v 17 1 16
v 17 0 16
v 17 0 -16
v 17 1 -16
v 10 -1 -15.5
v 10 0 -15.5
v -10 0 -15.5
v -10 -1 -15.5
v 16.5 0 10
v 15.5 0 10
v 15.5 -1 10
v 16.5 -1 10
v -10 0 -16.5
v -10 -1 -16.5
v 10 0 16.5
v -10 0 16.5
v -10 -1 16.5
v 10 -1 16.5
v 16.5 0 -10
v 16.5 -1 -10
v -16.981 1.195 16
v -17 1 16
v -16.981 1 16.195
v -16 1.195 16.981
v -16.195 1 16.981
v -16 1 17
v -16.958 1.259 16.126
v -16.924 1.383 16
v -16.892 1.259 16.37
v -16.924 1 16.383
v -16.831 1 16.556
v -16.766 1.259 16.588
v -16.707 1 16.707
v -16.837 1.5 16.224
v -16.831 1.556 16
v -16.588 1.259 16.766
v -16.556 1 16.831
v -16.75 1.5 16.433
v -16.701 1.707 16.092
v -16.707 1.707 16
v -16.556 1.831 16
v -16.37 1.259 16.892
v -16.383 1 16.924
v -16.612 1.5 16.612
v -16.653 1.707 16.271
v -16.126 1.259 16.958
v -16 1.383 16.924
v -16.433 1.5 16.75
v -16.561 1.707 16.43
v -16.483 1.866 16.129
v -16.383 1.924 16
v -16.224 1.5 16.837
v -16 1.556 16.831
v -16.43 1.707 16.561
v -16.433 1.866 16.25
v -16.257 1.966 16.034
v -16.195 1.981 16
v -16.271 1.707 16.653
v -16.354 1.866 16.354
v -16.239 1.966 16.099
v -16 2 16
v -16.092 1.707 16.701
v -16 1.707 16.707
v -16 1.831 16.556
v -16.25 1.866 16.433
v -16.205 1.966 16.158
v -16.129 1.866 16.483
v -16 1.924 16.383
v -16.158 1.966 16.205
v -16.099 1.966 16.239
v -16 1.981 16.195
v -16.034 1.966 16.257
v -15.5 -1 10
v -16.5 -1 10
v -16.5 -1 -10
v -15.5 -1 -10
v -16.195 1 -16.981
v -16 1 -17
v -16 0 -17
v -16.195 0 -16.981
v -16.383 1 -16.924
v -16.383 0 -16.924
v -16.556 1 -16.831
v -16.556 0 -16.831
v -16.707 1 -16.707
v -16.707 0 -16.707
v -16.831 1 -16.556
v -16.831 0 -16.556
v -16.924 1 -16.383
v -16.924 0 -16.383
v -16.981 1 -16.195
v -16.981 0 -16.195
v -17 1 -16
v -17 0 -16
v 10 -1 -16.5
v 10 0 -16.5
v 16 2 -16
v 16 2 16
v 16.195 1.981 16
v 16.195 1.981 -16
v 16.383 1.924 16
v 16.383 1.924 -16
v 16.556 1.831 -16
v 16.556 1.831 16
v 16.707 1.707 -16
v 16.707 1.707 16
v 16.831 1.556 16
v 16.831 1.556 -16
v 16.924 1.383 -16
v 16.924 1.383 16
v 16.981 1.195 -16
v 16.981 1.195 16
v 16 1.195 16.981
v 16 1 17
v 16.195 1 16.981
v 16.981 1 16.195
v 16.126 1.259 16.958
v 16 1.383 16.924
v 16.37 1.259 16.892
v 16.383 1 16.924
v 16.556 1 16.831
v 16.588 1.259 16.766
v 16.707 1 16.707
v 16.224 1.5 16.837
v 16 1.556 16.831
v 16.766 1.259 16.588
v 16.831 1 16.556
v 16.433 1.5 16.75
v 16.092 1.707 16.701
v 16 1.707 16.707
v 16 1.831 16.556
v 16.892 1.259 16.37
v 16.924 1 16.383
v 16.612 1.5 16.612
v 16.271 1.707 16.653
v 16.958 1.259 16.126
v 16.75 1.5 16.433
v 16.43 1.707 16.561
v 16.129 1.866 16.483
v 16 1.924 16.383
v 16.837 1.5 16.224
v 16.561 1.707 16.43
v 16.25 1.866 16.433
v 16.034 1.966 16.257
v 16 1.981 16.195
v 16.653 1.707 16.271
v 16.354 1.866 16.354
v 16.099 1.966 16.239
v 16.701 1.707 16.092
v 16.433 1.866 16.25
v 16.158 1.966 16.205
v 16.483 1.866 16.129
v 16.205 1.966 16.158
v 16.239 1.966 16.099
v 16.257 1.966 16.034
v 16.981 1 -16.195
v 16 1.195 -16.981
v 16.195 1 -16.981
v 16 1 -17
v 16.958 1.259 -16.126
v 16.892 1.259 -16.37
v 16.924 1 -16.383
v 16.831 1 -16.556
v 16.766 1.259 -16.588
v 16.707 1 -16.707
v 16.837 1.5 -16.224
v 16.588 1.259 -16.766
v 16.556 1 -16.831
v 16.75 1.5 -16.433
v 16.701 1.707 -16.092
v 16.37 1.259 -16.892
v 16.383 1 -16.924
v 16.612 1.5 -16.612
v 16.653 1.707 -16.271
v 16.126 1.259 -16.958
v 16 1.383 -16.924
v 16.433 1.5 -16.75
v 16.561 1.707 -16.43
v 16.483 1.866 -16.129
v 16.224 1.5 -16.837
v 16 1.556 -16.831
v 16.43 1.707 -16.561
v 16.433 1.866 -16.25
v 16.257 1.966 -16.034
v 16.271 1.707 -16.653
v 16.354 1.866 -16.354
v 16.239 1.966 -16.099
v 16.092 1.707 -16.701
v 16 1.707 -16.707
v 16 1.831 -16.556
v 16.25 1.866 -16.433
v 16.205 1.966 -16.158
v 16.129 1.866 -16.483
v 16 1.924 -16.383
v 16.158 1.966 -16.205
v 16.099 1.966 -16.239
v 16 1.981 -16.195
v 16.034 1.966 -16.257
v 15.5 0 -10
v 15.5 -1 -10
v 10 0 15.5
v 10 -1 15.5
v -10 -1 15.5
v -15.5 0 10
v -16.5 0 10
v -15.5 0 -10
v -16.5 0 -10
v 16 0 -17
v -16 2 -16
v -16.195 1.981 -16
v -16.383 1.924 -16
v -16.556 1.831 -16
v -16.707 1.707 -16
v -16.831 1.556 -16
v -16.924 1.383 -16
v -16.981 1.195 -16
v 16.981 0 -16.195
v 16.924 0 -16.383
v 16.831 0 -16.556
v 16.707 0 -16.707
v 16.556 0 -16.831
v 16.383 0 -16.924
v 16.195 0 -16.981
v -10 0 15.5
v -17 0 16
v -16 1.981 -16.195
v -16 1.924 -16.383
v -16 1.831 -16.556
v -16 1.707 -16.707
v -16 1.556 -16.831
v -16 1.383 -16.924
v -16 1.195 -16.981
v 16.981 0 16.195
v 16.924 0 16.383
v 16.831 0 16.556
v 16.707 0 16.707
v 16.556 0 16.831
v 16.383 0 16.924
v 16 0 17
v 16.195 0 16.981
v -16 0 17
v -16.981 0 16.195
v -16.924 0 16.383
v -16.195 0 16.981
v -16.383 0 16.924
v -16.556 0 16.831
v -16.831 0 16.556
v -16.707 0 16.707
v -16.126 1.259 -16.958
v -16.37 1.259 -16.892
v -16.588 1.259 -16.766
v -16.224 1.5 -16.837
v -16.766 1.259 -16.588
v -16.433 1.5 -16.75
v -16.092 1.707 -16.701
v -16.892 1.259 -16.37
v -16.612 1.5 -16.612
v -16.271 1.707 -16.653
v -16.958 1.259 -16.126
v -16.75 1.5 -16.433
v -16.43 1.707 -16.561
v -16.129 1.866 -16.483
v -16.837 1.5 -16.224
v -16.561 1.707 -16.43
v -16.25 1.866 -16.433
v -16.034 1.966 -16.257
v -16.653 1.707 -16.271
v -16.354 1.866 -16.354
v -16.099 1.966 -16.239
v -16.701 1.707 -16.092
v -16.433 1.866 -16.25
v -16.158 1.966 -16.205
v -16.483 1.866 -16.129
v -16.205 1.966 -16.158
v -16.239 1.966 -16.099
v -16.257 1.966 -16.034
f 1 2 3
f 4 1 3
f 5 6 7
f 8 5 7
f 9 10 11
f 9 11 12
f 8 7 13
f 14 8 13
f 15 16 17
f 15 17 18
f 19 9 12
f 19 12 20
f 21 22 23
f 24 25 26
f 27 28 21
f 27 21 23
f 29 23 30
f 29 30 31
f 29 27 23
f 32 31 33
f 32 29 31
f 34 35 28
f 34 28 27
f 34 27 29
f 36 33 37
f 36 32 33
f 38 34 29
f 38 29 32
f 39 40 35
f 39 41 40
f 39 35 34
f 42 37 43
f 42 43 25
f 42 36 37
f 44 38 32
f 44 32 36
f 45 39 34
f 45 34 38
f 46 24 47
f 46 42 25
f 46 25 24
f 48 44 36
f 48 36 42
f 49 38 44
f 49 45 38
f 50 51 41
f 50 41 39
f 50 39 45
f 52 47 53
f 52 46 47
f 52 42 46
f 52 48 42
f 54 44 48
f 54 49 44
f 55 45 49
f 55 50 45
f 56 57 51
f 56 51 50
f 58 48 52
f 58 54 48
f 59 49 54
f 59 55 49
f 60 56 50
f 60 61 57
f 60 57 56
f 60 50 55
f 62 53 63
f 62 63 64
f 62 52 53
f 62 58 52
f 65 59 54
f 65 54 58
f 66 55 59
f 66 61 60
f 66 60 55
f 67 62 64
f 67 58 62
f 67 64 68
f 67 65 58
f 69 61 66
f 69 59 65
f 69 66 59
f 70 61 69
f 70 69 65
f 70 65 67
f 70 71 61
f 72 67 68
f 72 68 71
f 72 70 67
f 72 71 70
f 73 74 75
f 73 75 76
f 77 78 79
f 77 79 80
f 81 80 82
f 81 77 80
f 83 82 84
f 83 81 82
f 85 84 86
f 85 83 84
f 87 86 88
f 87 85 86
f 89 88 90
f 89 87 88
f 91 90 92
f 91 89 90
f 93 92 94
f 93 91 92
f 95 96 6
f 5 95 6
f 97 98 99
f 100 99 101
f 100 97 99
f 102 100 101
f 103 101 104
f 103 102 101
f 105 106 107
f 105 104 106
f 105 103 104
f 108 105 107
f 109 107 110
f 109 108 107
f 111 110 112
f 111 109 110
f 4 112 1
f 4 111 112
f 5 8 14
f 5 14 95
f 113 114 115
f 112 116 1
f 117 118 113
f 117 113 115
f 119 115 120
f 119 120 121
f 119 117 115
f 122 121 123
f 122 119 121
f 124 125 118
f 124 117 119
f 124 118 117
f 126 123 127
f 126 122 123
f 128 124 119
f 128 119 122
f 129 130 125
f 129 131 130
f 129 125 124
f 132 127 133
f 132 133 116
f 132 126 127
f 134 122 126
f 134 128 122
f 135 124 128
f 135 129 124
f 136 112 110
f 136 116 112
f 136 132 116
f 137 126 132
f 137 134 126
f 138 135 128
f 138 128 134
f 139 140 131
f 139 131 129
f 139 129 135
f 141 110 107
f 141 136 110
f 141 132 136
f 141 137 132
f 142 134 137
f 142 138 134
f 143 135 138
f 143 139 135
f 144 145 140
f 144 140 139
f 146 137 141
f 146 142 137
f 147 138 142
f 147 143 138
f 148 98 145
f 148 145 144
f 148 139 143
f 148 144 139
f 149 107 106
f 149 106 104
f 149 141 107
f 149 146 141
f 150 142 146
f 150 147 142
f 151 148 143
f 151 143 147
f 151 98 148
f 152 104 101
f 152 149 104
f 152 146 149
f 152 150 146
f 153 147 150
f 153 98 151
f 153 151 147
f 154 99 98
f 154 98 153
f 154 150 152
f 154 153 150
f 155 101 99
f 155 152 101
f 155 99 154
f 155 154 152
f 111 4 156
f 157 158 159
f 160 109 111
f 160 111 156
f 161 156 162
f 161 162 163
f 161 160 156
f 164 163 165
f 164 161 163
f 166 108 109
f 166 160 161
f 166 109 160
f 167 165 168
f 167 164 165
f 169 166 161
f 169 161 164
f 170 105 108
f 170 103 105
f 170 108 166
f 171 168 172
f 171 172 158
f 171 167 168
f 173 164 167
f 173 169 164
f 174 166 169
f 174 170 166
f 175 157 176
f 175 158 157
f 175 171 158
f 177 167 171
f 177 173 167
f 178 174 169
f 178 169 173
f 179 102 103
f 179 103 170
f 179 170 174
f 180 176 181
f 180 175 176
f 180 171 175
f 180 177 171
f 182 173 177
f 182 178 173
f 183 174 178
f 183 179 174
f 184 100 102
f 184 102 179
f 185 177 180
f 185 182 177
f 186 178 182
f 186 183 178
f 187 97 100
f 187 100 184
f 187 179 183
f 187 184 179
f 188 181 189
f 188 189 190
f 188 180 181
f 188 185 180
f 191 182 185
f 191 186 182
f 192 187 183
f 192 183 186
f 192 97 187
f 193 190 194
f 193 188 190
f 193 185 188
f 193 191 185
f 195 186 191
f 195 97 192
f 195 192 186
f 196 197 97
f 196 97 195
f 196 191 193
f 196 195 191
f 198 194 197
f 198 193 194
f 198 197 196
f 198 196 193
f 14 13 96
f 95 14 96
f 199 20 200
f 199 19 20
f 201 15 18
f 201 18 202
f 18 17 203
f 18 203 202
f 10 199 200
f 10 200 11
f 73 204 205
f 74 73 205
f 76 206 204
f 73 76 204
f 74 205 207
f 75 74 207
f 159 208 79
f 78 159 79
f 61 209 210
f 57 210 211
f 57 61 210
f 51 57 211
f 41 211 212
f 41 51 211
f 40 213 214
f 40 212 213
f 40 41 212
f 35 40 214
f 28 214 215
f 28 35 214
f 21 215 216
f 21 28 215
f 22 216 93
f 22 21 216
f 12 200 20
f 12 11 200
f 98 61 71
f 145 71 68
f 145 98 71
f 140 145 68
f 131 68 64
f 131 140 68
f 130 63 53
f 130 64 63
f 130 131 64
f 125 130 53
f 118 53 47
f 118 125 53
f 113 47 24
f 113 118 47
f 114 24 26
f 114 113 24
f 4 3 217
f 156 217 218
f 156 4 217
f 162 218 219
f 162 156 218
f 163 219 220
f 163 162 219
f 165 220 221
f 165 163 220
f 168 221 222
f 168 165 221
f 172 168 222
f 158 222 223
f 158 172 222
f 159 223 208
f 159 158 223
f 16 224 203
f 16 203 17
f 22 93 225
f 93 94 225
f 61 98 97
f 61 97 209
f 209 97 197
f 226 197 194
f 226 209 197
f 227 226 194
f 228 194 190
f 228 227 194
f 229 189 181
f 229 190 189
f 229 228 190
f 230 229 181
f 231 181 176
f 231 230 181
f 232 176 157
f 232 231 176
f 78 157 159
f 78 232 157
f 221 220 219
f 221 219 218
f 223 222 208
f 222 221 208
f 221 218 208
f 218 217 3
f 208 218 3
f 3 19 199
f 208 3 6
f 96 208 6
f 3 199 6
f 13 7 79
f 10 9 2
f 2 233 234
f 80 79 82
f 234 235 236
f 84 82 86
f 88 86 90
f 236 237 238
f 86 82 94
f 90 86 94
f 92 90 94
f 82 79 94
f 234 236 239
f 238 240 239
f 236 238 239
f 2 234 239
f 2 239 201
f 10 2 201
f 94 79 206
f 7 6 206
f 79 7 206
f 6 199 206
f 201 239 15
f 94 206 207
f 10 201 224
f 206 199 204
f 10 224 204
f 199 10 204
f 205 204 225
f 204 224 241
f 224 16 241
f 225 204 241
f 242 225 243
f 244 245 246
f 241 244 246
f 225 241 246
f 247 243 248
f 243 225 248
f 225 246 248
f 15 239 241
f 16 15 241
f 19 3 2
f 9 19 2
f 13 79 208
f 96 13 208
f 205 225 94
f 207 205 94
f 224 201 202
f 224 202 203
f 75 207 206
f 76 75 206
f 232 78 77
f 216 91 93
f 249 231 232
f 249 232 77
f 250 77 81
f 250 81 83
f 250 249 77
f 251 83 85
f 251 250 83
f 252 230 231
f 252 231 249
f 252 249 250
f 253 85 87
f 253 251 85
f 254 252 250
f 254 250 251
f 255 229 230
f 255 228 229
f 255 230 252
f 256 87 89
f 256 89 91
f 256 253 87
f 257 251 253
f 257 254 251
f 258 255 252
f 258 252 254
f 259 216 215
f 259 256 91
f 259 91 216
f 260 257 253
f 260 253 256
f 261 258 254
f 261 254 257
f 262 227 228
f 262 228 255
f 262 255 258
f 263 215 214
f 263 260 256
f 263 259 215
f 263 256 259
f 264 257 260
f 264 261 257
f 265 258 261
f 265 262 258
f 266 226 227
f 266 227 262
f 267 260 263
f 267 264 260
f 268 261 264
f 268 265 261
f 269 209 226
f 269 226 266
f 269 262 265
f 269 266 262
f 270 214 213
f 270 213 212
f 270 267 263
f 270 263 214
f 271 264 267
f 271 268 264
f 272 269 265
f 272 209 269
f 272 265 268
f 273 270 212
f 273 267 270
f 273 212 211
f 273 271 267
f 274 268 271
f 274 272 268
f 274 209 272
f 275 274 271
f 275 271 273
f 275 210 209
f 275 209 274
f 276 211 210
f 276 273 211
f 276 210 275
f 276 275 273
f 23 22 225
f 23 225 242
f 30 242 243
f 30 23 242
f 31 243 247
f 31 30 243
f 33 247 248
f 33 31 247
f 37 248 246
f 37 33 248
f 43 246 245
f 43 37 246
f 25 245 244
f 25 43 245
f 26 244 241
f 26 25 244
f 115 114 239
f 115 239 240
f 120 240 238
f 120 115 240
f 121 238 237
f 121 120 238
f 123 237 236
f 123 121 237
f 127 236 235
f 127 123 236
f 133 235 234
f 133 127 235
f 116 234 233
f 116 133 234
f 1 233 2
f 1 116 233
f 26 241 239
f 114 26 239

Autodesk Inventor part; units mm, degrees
ref_plane "YZ Plane" through (0, 0, 0) normal (1, 0, 0) x (0, 1, 0)
ref_plane "XZ Plane" through (0, 0, 0) normal (0, 1, 0) x (-1, 0, 0)
ref_plane "XY Plane" through (0, 0, 0) normal (0, 0, 1) x (1, 0, 0)
sketch "Sketch4" plane through (0, 0, 0) normal (0, 1, 0) x (-1, 0, 0)
  line L0 (17, 17) -> (-17, 17)
  line L1 (-17, 17) -> (-17, -17)
  line L2 (-17, -17) -> (17, -17)
  line L3 (17, -17) -> (17, 17)
  line L4 (17, 17) -> (-17, -17) construction
  line L5 (-17, 17) -> (17, -17) construction
  point P0 (0, 0)
  dimension "d52" = 34
  dimension "d53" = 34
extrude "Extrusion5" add sketch "Sketch4" along normal blind 2
sketch "Sketch6" plane through (0, 0, 0) normal (0, -1, 0) x (1, 0, 0)
  line L0 (-16.5, -10) -> (-15.5, -10)
  line L1 (-15.5, -10) -> (-15.5, 10)
  line L2 (-15.5, 10) -> (-16.5, 10)
  line L3 (-16.5, 10) -> (-16.5, -10)
  line L4 (-15.5, -10) -> (-16.5, -10)
  line L5 (-16.5, -10) -> (-16.5, 10)
  line L6 (-16.5, 10) -> (-15.5, 10)
  line L7 (-15.5, 10) -> (-15.5, -10)
  line L8 (-10, 16.5) -> (10, 16.5)
  line L9 (10, 16.5) -> (10, 15.5)
  line L10 (10, 15.5) -> (-10, 15.5)
  line L11 (-10, 15.5) -> (-10, 16.5)
  line L12 (10, 16.5) -> (-10, 16.5)
  line L13 (-10, 16.5) -> (-10, 15.5)
  line L14 (-10, 15.5) -> (10, 15.5)
  line L15 (10, 15.5) -> (10, 16.5)
  line L16 (15.5, 10) -> (16.5, 10)
  line L17 (16.5, 10) -> (16.5, -10)
  line L18 (16.5, -10) -> (15.5, -10)
  line L19 (15.5, -10) -> (15.5, 10)
  line L20 (15.5, -10) -> (16.5, -10)
  line L21 (16.5, -10) -> (16.5, 10)
  line L22 (16.5, 10) -> (15.5, 10)
  line L23 (15.5, 10) -> (15.5, -10)
  line L24 (10, -15.5) -> (-10, -15.5)
  line L25 (-10, -15.5) -> (-10, -16.5)
  line L26 (-10, -16.5) -> (10, -16.5)
  line L27 (10, -16.5) -> (10, -15.5)
  line L28 (-10, -15.5) -> (10, -15.5)
  line L29 (10, -15.5) -> (10, -16.5)
  line L30 (10, -16.5) -> (-10, -16.5)
  line L31 (-10, -16.5) -> (-10, -15.5)
  line L32 (-17, 17) -> (-17, -17)
  line L33 (17, 17) -> (-17, 17)
  line L34 (17, -17) -> (17, 17)
  line L35 (-17, -17) -> (17, -17)
  line L36 (17, 17) -> (17, -17) projected
  line L37 (-17, -17) -> (-17, 17) projected
  line L38 (-17, 17) -> (17, 17) projected
  line L39 (17, -17) -> (-17, -17) projected
  point P0 (0, 0)
  point P1 (-16, 10)
  point P2 (-16, -10)
  point P3 (16, 10)
  point P4 (16, -10)
  point P5 (-10, -16)
  point P6 (-16, -10)
  dimension "d123" = 1
  dimension "d124" = 20
  dimension "d119" = 1
  dimension "d118" = 20
  dimension "d116" = 20
  dimension "d117" = 1
  dimension "d112" = 20
  dimension "d113" = 1
  dimension "d108" = 1
  dimension "d109" = 20
  dimension "d104" = 1
  dimension "d105" = 20
  dimension "d101" = 20
  dimension "d102" = 1
  dimension "d97" = 20
  dimension "d98" = 1
  dimension "d114" = 7
  dimension "d115" = 0.5
  dimension "d111" = 0.5
  dimension "d110" = 7
  dimension "d107" = 7
  dimension "d106" = 0.5
  dimension "d103" = 0.5
  dimension "d95" = 7
  dimension "d99" = 7
  dimension "d100" = 0.5
  dimension "d96" = 0.5
  dimension "d94" = 7
  dimension "d93" = 7
  dimension "d122" = 0.5
  dimension "d120" = 7
  dimension "d121" = 0.5
  dimension "d133" = 0
  dimension "d134" = 0
  dimension "d135" = 0
  dimension "d136" = 0
extrude "Extrusion7" add sketch "Sketch6" along normal blind 1 contours L3 L2 L1 L0 | L8 L9 L10 L11 | L16 L17 L18 L19 | L27 L26 L25 L24
fillet "Fillet9" radius 1 1 edges at (17, 1, -17)
fillet "Fillet10" radius 1 1 edges at (-17, 1, -17)
fillet "Fillet11" radius 1 1 edges at (-17, 1, 17)
fillet "Fillet12" radius 1 1 edges at (17, 1, 17)
fillet "Fillet13" radius 1 8 edges at (-16.7071, 2, -16.7071) (-17, 2, 0) (-16.7071, 2, 16.7071) (0, 2, 17) (16.7071, 2, 16.7071) (17, 2, 0) (16.7071, 2, -16.7071) (0, 2, -17)
properties part number "block_main" material "PC/ABS Plastic"
